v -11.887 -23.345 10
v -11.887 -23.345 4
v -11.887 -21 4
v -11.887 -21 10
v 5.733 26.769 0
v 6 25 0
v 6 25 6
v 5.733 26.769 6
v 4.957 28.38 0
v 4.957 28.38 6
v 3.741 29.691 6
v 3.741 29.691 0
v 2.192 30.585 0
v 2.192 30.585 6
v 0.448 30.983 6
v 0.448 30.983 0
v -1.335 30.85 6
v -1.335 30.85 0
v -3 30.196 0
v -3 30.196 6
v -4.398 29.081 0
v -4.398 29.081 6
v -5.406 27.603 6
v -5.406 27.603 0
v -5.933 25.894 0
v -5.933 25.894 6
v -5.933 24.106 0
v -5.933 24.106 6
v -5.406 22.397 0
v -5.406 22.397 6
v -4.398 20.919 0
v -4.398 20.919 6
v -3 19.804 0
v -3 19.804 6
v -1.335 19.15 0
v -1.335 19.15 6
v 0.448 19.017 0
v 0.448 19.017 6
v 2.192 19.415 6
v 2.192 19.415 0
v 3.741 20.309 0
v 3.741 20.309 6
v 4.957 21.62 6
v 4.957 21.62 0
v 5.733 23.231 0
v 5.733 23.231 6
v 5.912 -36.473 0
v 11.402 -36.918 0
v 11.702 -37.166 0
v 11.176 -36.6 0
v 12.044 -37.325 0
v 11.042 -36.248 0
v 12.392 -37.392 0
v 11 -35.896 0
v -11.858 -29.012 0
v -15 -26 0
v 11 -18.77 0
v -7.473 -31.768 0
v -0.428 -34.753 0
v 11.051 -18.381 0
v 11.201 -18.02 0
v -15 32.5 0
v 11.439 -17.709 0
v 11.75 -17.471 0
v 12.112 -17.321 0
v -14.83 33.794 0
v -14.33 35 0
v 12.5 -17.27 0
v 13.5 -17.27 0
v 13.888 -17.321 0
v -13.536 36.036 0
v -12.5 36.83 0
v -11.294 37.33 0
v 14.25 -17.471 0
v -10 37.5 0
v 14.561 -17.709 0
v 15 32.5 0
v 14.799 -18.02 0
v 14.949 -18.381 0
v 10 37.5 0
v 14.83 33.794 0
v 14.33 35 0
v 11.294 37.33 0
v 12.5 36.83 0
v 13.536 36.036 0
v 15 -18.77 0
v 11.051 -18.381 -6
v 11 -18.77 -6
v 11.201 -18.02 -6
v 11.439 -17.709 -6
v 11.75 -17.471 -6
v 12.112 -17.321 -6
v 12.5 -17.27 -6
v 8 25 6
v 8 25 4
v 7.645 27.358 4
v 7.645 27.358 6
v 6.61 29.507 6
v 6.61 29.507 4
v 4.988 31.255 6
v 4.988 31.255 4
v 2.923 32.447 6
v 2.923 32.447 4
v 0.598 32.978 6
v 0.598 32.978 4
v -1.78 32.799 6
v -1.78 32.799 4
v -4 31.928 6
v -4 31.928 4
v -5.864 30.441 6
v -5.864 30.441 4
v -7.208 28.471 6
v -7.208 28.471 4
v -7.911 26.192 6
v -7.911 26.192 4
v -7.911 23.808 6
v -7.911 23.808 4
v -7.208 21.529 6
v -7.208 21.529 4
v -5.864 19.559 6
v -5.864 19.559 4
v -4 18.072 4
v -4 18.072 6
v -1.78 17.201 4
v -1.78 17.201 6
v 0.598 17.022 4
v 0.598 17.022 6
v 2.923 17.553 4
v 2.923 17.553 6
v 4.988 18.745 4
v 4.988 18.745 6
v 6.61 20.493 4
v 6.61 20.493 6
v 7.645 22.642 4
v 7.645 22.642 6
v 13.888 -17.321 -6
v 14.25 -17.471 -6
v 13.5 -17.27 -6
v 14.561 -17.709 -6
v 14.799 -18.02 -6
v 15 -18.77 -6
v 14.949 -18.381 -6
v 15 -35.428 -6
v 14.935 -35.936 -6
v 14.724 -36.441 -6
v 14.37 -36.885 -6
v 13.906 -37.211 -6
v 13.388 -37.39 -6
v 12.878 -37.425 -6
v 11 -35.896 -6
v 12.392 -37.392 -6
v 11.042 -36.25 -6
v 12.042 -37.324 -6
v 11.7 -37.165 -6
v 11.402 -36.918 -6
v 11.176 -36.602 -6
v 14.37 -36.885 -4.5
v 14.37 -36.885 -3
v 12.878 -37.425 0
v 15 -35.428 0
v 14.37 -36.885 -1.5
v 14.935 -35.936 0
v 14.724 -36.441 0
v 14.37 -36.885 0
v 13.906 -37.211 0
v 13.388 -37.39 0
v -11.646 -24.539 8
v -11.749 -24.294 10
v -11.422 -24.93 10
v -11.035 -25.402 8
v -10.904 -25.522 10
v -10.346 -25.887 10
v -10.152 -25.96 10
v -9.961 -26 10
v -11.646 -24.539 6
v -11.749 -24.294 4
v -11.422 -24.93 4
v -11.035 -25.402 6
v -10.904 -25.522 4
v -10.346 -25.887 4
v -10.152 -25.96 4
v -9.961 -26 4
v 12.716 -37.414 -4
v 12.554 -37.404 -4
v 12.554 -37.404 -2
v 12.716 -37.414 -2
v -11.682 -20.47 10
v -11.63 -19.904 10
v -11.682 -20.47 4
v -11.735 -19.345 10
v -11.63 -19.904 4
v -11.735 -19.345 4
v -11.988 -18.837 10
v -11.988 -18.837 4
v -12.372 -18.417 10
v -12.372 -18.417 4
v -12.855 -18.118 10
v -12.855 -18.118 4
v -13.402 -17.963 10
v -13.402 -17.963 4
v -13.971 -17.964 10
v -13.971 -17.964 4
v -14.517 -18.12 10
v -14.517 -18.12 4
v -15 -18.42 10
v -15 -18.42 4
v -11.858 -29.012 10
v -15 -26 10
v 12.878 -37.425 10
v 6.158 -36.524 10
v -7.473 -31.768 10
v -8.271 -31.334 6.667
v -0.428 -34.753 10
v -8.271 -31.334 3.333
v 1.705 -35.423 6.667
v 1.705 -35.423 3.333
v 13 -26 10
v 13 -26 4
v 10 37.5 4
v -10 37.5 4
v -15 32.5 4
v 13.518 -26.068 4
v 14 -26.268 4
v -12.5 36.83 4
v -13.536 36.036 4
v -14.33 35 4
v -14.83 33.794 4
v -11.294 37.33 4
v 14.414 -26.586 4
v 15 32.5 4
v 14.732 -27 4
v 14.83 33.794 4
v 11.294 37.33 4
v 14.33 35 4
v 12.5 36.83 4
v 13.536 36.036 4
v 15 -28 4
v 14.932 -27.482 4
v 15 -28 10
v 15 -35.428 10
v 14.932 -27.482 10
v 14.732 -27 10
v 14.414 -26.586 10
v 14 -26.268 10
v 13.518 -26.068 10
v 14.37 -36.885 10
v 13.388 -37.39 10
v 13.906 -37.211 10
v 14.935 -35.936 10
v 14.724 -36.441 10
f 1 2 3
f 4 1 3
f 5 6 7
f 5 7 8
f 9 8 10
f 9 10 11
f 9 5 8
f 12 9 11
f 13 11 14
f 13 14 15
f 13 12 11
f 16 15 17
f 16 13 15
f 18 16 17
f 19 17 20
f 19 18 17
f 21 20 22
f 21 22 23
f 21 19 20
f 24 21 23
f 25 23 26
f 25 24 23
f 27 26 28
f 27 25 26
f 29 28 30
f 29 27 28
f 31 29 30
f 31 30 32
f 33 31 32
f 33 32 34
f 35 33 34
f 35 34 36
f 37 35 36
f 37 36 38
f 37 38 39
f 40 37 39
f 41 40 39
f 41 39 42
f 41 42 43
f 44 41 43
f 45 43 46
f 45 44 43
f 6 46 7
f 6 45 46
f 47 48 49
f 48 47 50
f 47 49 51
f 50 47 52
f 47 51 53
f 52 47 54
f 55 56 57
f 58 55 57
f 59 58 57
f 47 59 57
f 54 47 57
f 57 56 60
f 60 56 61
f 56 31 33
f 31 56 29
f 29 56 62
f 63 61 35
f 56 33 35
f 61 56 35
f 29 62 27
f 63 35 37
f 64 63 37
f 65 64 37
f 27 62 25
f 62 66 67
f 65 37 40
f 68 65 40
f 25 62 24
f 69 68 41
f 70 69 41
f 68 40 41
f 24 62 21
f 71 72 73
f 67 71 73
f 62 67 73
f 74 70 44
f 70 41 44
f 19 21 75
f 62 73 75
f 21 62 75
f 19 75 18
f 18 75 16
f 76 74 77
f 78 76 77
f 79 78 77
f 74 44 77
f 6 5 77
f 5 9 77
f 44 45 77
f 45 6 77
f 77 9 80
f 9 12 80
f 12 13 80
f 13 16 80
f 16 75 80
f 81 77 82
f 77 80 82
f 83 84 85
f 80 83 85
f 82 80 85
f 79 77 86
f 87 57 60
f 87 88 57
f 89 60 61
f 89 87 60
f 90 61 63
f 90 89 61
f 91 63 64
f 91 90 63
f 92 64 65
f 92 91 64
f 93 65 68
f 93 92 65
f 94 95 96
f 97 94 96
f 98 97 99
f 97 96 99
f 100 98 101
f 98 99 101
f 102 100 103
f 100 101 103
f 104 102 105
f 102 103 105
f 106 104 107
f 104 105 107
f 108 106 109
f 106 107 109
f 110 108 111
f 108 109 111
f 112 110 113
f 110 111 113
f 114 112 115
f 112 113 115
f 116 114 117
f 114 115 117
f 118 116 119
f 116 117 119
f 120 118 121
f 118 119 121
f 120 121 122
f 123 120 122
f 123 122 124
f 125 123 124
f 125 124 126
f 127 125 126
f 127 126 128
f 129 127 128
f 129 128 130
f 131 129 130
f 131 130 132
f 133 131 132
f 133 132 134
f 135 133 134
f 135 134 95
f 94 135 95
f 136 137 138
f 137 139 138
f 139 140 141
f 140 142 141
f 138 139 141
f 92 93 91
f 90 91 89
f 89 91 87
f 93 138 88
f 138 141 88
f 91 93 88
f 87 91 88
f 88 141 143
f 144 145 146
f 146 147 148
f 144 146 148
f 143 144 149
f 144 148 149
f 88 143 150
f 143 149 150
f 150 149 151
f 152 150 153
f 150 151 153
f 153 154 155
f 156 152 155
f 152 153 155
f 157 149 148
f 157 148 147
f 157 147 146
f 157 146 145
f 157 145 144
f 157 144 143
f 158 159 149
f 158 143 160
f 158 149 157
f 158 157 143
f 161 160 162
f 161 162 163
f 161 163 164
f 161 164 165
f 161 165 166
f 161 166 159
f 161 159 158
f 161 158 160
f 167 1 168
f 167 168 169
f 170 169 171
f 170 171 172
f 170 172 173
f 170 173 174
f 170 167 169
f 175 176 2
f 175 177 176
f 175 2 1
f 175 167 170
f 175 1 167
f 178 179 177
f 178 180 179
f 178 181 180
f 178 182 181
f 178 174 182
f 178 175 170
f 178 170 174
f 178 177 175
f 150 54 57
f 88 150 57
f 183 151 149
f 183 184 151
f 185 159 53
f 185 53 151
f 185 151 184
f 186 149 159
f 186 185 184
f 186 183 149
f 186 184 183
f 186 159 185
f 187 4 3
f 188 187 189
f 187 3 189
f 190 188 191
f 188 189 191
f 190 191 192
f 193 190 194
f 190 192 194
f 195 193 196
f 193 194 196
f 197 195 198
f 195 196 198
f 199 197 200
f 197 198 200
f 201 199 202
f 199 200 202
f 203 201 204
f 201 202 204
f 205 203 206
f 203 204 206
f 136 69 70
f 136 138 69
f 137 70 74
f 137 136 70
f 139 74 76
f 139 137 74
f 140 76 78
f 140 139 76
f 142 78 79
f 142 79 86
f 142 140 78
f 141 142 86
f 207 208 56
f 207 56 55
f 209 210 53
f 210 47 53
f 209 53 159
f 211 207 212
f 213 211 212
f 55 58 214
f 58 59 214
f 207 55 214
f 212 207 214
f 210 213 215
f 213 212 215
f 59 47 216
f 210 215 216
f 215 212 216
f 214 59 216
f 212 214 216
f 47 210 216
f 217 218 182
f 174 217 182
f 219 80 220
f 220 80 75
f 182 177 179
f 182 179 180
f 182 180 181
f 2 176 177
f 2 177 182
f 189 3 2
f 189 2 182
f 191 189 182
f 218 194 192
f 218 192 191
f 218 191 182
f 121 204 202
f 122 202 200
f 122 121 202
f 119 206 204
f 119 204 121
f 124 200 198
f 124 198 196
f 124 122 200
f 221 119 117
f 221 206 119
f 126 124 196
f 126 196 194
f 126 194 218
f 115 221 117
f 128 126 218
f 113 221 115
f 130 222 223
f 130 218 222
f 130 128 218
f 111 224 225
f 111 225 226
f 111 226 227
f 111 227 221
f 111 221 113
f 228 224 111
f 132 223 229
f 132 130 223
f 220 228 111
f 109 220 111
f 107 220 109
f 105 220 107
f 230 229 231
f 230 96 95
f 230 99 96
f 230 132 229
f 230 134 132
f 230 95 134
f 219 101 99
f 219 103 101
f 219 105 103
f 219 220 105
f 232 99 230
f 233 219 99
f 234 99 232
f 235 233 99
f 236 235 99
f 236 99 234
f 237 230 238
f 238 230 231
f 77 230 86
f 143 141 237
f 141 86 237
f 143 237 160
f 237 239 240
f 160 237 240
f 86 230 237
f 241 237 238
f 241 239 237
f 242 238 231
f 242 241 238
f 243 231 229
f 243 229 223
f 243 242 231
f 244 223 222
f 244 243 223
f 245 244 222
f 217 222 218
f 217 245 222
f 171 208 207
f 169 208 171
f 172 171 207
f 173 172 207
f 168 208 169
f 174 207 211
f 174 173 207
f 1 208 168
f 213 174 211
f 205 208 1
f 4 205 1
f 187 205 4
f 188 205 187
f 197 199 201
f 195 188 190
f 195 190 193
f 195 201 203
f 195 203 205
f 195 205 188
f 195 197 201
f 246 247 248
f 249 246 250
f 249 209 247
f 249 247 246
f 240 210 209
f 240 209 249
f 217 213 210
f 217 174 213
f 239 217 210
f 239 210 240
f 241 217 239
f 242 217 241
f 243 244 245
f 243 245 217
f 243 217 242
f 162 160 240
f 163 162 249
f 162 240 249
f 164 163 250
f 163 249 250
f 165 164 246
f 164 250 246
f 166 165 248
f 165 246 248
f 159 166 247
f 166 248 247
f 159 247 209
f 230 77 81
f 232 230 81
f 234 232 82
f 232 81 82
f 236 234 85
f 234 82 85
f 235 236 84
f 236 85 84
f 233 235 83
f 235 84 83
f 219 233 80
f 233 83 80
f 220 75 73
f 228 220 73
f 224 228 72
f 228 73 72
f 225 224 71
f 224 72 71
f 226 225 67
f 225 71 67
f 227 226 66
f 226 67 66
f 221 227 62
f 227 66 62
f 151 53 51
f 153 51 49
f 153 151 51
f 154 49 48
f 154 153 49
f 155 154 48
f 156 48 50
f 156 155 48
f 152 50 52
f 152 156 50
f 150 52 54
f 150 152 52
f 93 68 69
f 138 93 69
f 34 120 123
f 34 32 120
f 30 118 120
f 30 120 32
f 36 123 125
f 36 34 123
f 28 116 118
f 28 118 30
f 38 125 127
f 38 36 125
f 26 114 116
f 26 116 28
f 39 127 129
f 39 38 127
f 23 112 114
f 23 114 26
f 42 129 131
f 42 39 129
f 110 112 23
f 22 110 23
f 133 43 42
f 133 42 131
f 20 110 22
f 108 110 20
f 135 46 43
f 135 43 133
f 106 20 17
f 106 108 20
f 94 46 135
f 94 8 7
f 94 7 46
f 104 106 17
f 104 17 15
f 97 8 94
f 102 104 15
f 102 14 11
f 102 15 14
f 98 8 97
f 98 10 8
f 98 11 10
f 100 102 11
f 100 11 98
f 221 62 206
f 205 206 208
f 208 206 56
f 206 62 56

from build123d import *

# Parameters (mm, degrees)
F1_DEPTH = 10
F0_R     = 8
F2_DEPTH = 4
F0_R_2   = 6
F3_DEPTH = 6
F5_R     = 2
F7_DEPTH = 6
F8_R     = 1.5


with BuildPart() as f1:
    # F0 (on Top) → F1 (new body)
    with BuildSketch(Plane.XY):
        with BuildLine():
            Line((15, -37.5), (15, -26))
            Line((15, -26), (-9.9611850455, -26))
            add(Edge.make_bspline(
                [(-11.8869803846, -23.3454480823), (-11.8503261617, -24.0200703773), (-11.7257091732, -24.4668508278), (-11.1064253641, -25.4653853658), (-10.3231083129, -25.9576724499), (-9.9611850455, -26)],
                knots=[0, 0, 0, 0, 0.3405412191, 0.6578755277, 1, 1, 1, 1], degree=3))
            Line((-11.8869803846, -23.3454480823), (-11.8869803846, -21))
            ThreePointArc((-11.8869803846, -21), (-12.3717296786, -18.4168176701), (-15, -18.4196364135))
            Line((-15, -18.4196364135), (-15, -26))
            add(Edge.make_bspline(
                [(-15, -26), (-10.2944150567, -32.0423617959), (3.415344283, -37.3965017498), (15, -37.5)],
                knots=[0, 0, 0, 0, 32.1286476528, 32.1286476528, 32.1286476528, 32.1286476528], degree=3))
        make_face()
    extrude(amount=F1_DEPTH)


with BuildPart() as f2:
    # F0 (on Top) → F2 (new body)
    with BuildSketch(Plane.XY):
        with BuildLine():
            ThreePointArc((15, 32.5), (13.5355339059, 36.0355339059), (10, 37.5))
            Line((10, 37.5), (-10, 37.5))
            ThreePointArc((-10, 37.5), (-13.5355339059, 36.0355339059), (-15, 32.5))
            Line((-15, 32.5), (-15, -18.4196364135))
            ThreePointArc((-15, -18.4196364135), (-12.3717296786, -18.4168176701), (-11.8869803846, -21))
            Line((-11.8869803846, -21), (-11.8869803846, -23.3454480823))
            add(Edge.make_bspline(
                [(-11.8869803846, -23.3454480823), (-11.8503261617, -24.0200703773), (-11.7257091732, -24.4668508278), (-11.1064253641, -25.4653853658), (-10.3231083129, -25.9576724499), (-9.9611850455, -26)],
                knots=[0, 0, 0, 0, 0.3405412191, 0.6578755277, 1, 1, 1, 1], degree=3))
            Line((-9.9611850455, -26), (15, -26))
            Line((15, -26), (15, 32.5))
        make_face()
        with Locations((0, 25)):
            Circle(F0_R, mode=Mode.SUBTRACT)
    extrude(amount=F2_DEPTH)

    # F0 (on Top) → F3 (join)
    with BuildSketch(Plane.XY):
        with Locations((0, 25)):
            Circle(F0_R)
        with Locations((0, 25)):
            Circle(F0_R_2, mode=Mode.SUBTRACT)
    extrude(amount=F3_DEPTH)

    # F4: union F1
    add(f1.part)

    # F5
    f5_edges = [f2.edges().sort_by_distance(p)[0] for p in [
        (15, -26, 7),
        (15, -37.5, 5),
    ]]
    fillet(f5_edges, radius=F5_R)

    # F6 (on face) → F7 (join)
    with BuildSketch(Plane(origin=(0, 0, 0), x_dir=(1, 0, 0), z_dir=(0, 0, -1))):
        with BuildLine():
            add(Edge.make_bspline(
                [(11, 37.2695901222), (11.6289216889, 37.3346734853), (12.2554361711, 37.3865849072), (12.8779100925, 37.4246547986)],
                knots=[28.4914152983, 28.4914152983, 28.4914152983, 28.4914152983, 30.1861311863, 30.1861311863, 30.1861311863, 30.1861311863], degree=3))
            Line((11, 37.2695901222), (11, 17.2695901222))
            Line((11, 17.2695901222), (15, 17.2695901222))
            Line((15, 17.2695901222), (15, 35.4283847632))
            add(Edge.make_bspline(
                [(12.8779100925, 37.4246547986), (12.9997851475, 37.4321085568), (13.1257670983, 37.4308511004), (13.2548827191, 37.4198425025), (13.3858269049, 37.3981737159), (13.516965577, 37.3652625635), (13.7771948673, 37.2763649582), (13.9062664101, 37.2201858037), (14.0319471175, 37.1523455077), (14.1523190287, 37.0732018707), (14.2655986066, 36.9836823621), (14.4751385881, 36.7865661207), (14.571406291, 36.6789625216), (14.6577504243, 36.5636464215), (14.7331363723, 36.4423414141), (14.7970899201, 36.3169400414), (14.9017074178, 36.0626228243), (14.9425625457, 35.9337377832), (14.9721844022, 35.8043605761), (14.9910543263, 35.676157773), (15, 35.5504875377), (15, 35.4283847632)],
                knots=[0, 0, 0, 0, 0, 0, 0, 0.2489631265, 0.2489631265, 0.2489631265, 0.2489631265, 0.2489631265, 0.5, 0.5, 0.5, 0.5, 0.5, 0.7510368735, 0.7510368735, 0.7510368735, 0.7510368735, 0.7510368735, 1, 1, 1, 1, 1, 1, 1], degree=6))
        make_face()
    extrude(amount=F7_DEPTH)

    # F8
    f8_edges = [f2.edges().sort_by_distance(p)[0] for p in [
        (11, -17.26959, -3),
        (15, -17.26959, -3),
        (11, -37.26959, -3),
    ]]
    fillet(f8_edges, radius=F8_R)


solid = f2.part
